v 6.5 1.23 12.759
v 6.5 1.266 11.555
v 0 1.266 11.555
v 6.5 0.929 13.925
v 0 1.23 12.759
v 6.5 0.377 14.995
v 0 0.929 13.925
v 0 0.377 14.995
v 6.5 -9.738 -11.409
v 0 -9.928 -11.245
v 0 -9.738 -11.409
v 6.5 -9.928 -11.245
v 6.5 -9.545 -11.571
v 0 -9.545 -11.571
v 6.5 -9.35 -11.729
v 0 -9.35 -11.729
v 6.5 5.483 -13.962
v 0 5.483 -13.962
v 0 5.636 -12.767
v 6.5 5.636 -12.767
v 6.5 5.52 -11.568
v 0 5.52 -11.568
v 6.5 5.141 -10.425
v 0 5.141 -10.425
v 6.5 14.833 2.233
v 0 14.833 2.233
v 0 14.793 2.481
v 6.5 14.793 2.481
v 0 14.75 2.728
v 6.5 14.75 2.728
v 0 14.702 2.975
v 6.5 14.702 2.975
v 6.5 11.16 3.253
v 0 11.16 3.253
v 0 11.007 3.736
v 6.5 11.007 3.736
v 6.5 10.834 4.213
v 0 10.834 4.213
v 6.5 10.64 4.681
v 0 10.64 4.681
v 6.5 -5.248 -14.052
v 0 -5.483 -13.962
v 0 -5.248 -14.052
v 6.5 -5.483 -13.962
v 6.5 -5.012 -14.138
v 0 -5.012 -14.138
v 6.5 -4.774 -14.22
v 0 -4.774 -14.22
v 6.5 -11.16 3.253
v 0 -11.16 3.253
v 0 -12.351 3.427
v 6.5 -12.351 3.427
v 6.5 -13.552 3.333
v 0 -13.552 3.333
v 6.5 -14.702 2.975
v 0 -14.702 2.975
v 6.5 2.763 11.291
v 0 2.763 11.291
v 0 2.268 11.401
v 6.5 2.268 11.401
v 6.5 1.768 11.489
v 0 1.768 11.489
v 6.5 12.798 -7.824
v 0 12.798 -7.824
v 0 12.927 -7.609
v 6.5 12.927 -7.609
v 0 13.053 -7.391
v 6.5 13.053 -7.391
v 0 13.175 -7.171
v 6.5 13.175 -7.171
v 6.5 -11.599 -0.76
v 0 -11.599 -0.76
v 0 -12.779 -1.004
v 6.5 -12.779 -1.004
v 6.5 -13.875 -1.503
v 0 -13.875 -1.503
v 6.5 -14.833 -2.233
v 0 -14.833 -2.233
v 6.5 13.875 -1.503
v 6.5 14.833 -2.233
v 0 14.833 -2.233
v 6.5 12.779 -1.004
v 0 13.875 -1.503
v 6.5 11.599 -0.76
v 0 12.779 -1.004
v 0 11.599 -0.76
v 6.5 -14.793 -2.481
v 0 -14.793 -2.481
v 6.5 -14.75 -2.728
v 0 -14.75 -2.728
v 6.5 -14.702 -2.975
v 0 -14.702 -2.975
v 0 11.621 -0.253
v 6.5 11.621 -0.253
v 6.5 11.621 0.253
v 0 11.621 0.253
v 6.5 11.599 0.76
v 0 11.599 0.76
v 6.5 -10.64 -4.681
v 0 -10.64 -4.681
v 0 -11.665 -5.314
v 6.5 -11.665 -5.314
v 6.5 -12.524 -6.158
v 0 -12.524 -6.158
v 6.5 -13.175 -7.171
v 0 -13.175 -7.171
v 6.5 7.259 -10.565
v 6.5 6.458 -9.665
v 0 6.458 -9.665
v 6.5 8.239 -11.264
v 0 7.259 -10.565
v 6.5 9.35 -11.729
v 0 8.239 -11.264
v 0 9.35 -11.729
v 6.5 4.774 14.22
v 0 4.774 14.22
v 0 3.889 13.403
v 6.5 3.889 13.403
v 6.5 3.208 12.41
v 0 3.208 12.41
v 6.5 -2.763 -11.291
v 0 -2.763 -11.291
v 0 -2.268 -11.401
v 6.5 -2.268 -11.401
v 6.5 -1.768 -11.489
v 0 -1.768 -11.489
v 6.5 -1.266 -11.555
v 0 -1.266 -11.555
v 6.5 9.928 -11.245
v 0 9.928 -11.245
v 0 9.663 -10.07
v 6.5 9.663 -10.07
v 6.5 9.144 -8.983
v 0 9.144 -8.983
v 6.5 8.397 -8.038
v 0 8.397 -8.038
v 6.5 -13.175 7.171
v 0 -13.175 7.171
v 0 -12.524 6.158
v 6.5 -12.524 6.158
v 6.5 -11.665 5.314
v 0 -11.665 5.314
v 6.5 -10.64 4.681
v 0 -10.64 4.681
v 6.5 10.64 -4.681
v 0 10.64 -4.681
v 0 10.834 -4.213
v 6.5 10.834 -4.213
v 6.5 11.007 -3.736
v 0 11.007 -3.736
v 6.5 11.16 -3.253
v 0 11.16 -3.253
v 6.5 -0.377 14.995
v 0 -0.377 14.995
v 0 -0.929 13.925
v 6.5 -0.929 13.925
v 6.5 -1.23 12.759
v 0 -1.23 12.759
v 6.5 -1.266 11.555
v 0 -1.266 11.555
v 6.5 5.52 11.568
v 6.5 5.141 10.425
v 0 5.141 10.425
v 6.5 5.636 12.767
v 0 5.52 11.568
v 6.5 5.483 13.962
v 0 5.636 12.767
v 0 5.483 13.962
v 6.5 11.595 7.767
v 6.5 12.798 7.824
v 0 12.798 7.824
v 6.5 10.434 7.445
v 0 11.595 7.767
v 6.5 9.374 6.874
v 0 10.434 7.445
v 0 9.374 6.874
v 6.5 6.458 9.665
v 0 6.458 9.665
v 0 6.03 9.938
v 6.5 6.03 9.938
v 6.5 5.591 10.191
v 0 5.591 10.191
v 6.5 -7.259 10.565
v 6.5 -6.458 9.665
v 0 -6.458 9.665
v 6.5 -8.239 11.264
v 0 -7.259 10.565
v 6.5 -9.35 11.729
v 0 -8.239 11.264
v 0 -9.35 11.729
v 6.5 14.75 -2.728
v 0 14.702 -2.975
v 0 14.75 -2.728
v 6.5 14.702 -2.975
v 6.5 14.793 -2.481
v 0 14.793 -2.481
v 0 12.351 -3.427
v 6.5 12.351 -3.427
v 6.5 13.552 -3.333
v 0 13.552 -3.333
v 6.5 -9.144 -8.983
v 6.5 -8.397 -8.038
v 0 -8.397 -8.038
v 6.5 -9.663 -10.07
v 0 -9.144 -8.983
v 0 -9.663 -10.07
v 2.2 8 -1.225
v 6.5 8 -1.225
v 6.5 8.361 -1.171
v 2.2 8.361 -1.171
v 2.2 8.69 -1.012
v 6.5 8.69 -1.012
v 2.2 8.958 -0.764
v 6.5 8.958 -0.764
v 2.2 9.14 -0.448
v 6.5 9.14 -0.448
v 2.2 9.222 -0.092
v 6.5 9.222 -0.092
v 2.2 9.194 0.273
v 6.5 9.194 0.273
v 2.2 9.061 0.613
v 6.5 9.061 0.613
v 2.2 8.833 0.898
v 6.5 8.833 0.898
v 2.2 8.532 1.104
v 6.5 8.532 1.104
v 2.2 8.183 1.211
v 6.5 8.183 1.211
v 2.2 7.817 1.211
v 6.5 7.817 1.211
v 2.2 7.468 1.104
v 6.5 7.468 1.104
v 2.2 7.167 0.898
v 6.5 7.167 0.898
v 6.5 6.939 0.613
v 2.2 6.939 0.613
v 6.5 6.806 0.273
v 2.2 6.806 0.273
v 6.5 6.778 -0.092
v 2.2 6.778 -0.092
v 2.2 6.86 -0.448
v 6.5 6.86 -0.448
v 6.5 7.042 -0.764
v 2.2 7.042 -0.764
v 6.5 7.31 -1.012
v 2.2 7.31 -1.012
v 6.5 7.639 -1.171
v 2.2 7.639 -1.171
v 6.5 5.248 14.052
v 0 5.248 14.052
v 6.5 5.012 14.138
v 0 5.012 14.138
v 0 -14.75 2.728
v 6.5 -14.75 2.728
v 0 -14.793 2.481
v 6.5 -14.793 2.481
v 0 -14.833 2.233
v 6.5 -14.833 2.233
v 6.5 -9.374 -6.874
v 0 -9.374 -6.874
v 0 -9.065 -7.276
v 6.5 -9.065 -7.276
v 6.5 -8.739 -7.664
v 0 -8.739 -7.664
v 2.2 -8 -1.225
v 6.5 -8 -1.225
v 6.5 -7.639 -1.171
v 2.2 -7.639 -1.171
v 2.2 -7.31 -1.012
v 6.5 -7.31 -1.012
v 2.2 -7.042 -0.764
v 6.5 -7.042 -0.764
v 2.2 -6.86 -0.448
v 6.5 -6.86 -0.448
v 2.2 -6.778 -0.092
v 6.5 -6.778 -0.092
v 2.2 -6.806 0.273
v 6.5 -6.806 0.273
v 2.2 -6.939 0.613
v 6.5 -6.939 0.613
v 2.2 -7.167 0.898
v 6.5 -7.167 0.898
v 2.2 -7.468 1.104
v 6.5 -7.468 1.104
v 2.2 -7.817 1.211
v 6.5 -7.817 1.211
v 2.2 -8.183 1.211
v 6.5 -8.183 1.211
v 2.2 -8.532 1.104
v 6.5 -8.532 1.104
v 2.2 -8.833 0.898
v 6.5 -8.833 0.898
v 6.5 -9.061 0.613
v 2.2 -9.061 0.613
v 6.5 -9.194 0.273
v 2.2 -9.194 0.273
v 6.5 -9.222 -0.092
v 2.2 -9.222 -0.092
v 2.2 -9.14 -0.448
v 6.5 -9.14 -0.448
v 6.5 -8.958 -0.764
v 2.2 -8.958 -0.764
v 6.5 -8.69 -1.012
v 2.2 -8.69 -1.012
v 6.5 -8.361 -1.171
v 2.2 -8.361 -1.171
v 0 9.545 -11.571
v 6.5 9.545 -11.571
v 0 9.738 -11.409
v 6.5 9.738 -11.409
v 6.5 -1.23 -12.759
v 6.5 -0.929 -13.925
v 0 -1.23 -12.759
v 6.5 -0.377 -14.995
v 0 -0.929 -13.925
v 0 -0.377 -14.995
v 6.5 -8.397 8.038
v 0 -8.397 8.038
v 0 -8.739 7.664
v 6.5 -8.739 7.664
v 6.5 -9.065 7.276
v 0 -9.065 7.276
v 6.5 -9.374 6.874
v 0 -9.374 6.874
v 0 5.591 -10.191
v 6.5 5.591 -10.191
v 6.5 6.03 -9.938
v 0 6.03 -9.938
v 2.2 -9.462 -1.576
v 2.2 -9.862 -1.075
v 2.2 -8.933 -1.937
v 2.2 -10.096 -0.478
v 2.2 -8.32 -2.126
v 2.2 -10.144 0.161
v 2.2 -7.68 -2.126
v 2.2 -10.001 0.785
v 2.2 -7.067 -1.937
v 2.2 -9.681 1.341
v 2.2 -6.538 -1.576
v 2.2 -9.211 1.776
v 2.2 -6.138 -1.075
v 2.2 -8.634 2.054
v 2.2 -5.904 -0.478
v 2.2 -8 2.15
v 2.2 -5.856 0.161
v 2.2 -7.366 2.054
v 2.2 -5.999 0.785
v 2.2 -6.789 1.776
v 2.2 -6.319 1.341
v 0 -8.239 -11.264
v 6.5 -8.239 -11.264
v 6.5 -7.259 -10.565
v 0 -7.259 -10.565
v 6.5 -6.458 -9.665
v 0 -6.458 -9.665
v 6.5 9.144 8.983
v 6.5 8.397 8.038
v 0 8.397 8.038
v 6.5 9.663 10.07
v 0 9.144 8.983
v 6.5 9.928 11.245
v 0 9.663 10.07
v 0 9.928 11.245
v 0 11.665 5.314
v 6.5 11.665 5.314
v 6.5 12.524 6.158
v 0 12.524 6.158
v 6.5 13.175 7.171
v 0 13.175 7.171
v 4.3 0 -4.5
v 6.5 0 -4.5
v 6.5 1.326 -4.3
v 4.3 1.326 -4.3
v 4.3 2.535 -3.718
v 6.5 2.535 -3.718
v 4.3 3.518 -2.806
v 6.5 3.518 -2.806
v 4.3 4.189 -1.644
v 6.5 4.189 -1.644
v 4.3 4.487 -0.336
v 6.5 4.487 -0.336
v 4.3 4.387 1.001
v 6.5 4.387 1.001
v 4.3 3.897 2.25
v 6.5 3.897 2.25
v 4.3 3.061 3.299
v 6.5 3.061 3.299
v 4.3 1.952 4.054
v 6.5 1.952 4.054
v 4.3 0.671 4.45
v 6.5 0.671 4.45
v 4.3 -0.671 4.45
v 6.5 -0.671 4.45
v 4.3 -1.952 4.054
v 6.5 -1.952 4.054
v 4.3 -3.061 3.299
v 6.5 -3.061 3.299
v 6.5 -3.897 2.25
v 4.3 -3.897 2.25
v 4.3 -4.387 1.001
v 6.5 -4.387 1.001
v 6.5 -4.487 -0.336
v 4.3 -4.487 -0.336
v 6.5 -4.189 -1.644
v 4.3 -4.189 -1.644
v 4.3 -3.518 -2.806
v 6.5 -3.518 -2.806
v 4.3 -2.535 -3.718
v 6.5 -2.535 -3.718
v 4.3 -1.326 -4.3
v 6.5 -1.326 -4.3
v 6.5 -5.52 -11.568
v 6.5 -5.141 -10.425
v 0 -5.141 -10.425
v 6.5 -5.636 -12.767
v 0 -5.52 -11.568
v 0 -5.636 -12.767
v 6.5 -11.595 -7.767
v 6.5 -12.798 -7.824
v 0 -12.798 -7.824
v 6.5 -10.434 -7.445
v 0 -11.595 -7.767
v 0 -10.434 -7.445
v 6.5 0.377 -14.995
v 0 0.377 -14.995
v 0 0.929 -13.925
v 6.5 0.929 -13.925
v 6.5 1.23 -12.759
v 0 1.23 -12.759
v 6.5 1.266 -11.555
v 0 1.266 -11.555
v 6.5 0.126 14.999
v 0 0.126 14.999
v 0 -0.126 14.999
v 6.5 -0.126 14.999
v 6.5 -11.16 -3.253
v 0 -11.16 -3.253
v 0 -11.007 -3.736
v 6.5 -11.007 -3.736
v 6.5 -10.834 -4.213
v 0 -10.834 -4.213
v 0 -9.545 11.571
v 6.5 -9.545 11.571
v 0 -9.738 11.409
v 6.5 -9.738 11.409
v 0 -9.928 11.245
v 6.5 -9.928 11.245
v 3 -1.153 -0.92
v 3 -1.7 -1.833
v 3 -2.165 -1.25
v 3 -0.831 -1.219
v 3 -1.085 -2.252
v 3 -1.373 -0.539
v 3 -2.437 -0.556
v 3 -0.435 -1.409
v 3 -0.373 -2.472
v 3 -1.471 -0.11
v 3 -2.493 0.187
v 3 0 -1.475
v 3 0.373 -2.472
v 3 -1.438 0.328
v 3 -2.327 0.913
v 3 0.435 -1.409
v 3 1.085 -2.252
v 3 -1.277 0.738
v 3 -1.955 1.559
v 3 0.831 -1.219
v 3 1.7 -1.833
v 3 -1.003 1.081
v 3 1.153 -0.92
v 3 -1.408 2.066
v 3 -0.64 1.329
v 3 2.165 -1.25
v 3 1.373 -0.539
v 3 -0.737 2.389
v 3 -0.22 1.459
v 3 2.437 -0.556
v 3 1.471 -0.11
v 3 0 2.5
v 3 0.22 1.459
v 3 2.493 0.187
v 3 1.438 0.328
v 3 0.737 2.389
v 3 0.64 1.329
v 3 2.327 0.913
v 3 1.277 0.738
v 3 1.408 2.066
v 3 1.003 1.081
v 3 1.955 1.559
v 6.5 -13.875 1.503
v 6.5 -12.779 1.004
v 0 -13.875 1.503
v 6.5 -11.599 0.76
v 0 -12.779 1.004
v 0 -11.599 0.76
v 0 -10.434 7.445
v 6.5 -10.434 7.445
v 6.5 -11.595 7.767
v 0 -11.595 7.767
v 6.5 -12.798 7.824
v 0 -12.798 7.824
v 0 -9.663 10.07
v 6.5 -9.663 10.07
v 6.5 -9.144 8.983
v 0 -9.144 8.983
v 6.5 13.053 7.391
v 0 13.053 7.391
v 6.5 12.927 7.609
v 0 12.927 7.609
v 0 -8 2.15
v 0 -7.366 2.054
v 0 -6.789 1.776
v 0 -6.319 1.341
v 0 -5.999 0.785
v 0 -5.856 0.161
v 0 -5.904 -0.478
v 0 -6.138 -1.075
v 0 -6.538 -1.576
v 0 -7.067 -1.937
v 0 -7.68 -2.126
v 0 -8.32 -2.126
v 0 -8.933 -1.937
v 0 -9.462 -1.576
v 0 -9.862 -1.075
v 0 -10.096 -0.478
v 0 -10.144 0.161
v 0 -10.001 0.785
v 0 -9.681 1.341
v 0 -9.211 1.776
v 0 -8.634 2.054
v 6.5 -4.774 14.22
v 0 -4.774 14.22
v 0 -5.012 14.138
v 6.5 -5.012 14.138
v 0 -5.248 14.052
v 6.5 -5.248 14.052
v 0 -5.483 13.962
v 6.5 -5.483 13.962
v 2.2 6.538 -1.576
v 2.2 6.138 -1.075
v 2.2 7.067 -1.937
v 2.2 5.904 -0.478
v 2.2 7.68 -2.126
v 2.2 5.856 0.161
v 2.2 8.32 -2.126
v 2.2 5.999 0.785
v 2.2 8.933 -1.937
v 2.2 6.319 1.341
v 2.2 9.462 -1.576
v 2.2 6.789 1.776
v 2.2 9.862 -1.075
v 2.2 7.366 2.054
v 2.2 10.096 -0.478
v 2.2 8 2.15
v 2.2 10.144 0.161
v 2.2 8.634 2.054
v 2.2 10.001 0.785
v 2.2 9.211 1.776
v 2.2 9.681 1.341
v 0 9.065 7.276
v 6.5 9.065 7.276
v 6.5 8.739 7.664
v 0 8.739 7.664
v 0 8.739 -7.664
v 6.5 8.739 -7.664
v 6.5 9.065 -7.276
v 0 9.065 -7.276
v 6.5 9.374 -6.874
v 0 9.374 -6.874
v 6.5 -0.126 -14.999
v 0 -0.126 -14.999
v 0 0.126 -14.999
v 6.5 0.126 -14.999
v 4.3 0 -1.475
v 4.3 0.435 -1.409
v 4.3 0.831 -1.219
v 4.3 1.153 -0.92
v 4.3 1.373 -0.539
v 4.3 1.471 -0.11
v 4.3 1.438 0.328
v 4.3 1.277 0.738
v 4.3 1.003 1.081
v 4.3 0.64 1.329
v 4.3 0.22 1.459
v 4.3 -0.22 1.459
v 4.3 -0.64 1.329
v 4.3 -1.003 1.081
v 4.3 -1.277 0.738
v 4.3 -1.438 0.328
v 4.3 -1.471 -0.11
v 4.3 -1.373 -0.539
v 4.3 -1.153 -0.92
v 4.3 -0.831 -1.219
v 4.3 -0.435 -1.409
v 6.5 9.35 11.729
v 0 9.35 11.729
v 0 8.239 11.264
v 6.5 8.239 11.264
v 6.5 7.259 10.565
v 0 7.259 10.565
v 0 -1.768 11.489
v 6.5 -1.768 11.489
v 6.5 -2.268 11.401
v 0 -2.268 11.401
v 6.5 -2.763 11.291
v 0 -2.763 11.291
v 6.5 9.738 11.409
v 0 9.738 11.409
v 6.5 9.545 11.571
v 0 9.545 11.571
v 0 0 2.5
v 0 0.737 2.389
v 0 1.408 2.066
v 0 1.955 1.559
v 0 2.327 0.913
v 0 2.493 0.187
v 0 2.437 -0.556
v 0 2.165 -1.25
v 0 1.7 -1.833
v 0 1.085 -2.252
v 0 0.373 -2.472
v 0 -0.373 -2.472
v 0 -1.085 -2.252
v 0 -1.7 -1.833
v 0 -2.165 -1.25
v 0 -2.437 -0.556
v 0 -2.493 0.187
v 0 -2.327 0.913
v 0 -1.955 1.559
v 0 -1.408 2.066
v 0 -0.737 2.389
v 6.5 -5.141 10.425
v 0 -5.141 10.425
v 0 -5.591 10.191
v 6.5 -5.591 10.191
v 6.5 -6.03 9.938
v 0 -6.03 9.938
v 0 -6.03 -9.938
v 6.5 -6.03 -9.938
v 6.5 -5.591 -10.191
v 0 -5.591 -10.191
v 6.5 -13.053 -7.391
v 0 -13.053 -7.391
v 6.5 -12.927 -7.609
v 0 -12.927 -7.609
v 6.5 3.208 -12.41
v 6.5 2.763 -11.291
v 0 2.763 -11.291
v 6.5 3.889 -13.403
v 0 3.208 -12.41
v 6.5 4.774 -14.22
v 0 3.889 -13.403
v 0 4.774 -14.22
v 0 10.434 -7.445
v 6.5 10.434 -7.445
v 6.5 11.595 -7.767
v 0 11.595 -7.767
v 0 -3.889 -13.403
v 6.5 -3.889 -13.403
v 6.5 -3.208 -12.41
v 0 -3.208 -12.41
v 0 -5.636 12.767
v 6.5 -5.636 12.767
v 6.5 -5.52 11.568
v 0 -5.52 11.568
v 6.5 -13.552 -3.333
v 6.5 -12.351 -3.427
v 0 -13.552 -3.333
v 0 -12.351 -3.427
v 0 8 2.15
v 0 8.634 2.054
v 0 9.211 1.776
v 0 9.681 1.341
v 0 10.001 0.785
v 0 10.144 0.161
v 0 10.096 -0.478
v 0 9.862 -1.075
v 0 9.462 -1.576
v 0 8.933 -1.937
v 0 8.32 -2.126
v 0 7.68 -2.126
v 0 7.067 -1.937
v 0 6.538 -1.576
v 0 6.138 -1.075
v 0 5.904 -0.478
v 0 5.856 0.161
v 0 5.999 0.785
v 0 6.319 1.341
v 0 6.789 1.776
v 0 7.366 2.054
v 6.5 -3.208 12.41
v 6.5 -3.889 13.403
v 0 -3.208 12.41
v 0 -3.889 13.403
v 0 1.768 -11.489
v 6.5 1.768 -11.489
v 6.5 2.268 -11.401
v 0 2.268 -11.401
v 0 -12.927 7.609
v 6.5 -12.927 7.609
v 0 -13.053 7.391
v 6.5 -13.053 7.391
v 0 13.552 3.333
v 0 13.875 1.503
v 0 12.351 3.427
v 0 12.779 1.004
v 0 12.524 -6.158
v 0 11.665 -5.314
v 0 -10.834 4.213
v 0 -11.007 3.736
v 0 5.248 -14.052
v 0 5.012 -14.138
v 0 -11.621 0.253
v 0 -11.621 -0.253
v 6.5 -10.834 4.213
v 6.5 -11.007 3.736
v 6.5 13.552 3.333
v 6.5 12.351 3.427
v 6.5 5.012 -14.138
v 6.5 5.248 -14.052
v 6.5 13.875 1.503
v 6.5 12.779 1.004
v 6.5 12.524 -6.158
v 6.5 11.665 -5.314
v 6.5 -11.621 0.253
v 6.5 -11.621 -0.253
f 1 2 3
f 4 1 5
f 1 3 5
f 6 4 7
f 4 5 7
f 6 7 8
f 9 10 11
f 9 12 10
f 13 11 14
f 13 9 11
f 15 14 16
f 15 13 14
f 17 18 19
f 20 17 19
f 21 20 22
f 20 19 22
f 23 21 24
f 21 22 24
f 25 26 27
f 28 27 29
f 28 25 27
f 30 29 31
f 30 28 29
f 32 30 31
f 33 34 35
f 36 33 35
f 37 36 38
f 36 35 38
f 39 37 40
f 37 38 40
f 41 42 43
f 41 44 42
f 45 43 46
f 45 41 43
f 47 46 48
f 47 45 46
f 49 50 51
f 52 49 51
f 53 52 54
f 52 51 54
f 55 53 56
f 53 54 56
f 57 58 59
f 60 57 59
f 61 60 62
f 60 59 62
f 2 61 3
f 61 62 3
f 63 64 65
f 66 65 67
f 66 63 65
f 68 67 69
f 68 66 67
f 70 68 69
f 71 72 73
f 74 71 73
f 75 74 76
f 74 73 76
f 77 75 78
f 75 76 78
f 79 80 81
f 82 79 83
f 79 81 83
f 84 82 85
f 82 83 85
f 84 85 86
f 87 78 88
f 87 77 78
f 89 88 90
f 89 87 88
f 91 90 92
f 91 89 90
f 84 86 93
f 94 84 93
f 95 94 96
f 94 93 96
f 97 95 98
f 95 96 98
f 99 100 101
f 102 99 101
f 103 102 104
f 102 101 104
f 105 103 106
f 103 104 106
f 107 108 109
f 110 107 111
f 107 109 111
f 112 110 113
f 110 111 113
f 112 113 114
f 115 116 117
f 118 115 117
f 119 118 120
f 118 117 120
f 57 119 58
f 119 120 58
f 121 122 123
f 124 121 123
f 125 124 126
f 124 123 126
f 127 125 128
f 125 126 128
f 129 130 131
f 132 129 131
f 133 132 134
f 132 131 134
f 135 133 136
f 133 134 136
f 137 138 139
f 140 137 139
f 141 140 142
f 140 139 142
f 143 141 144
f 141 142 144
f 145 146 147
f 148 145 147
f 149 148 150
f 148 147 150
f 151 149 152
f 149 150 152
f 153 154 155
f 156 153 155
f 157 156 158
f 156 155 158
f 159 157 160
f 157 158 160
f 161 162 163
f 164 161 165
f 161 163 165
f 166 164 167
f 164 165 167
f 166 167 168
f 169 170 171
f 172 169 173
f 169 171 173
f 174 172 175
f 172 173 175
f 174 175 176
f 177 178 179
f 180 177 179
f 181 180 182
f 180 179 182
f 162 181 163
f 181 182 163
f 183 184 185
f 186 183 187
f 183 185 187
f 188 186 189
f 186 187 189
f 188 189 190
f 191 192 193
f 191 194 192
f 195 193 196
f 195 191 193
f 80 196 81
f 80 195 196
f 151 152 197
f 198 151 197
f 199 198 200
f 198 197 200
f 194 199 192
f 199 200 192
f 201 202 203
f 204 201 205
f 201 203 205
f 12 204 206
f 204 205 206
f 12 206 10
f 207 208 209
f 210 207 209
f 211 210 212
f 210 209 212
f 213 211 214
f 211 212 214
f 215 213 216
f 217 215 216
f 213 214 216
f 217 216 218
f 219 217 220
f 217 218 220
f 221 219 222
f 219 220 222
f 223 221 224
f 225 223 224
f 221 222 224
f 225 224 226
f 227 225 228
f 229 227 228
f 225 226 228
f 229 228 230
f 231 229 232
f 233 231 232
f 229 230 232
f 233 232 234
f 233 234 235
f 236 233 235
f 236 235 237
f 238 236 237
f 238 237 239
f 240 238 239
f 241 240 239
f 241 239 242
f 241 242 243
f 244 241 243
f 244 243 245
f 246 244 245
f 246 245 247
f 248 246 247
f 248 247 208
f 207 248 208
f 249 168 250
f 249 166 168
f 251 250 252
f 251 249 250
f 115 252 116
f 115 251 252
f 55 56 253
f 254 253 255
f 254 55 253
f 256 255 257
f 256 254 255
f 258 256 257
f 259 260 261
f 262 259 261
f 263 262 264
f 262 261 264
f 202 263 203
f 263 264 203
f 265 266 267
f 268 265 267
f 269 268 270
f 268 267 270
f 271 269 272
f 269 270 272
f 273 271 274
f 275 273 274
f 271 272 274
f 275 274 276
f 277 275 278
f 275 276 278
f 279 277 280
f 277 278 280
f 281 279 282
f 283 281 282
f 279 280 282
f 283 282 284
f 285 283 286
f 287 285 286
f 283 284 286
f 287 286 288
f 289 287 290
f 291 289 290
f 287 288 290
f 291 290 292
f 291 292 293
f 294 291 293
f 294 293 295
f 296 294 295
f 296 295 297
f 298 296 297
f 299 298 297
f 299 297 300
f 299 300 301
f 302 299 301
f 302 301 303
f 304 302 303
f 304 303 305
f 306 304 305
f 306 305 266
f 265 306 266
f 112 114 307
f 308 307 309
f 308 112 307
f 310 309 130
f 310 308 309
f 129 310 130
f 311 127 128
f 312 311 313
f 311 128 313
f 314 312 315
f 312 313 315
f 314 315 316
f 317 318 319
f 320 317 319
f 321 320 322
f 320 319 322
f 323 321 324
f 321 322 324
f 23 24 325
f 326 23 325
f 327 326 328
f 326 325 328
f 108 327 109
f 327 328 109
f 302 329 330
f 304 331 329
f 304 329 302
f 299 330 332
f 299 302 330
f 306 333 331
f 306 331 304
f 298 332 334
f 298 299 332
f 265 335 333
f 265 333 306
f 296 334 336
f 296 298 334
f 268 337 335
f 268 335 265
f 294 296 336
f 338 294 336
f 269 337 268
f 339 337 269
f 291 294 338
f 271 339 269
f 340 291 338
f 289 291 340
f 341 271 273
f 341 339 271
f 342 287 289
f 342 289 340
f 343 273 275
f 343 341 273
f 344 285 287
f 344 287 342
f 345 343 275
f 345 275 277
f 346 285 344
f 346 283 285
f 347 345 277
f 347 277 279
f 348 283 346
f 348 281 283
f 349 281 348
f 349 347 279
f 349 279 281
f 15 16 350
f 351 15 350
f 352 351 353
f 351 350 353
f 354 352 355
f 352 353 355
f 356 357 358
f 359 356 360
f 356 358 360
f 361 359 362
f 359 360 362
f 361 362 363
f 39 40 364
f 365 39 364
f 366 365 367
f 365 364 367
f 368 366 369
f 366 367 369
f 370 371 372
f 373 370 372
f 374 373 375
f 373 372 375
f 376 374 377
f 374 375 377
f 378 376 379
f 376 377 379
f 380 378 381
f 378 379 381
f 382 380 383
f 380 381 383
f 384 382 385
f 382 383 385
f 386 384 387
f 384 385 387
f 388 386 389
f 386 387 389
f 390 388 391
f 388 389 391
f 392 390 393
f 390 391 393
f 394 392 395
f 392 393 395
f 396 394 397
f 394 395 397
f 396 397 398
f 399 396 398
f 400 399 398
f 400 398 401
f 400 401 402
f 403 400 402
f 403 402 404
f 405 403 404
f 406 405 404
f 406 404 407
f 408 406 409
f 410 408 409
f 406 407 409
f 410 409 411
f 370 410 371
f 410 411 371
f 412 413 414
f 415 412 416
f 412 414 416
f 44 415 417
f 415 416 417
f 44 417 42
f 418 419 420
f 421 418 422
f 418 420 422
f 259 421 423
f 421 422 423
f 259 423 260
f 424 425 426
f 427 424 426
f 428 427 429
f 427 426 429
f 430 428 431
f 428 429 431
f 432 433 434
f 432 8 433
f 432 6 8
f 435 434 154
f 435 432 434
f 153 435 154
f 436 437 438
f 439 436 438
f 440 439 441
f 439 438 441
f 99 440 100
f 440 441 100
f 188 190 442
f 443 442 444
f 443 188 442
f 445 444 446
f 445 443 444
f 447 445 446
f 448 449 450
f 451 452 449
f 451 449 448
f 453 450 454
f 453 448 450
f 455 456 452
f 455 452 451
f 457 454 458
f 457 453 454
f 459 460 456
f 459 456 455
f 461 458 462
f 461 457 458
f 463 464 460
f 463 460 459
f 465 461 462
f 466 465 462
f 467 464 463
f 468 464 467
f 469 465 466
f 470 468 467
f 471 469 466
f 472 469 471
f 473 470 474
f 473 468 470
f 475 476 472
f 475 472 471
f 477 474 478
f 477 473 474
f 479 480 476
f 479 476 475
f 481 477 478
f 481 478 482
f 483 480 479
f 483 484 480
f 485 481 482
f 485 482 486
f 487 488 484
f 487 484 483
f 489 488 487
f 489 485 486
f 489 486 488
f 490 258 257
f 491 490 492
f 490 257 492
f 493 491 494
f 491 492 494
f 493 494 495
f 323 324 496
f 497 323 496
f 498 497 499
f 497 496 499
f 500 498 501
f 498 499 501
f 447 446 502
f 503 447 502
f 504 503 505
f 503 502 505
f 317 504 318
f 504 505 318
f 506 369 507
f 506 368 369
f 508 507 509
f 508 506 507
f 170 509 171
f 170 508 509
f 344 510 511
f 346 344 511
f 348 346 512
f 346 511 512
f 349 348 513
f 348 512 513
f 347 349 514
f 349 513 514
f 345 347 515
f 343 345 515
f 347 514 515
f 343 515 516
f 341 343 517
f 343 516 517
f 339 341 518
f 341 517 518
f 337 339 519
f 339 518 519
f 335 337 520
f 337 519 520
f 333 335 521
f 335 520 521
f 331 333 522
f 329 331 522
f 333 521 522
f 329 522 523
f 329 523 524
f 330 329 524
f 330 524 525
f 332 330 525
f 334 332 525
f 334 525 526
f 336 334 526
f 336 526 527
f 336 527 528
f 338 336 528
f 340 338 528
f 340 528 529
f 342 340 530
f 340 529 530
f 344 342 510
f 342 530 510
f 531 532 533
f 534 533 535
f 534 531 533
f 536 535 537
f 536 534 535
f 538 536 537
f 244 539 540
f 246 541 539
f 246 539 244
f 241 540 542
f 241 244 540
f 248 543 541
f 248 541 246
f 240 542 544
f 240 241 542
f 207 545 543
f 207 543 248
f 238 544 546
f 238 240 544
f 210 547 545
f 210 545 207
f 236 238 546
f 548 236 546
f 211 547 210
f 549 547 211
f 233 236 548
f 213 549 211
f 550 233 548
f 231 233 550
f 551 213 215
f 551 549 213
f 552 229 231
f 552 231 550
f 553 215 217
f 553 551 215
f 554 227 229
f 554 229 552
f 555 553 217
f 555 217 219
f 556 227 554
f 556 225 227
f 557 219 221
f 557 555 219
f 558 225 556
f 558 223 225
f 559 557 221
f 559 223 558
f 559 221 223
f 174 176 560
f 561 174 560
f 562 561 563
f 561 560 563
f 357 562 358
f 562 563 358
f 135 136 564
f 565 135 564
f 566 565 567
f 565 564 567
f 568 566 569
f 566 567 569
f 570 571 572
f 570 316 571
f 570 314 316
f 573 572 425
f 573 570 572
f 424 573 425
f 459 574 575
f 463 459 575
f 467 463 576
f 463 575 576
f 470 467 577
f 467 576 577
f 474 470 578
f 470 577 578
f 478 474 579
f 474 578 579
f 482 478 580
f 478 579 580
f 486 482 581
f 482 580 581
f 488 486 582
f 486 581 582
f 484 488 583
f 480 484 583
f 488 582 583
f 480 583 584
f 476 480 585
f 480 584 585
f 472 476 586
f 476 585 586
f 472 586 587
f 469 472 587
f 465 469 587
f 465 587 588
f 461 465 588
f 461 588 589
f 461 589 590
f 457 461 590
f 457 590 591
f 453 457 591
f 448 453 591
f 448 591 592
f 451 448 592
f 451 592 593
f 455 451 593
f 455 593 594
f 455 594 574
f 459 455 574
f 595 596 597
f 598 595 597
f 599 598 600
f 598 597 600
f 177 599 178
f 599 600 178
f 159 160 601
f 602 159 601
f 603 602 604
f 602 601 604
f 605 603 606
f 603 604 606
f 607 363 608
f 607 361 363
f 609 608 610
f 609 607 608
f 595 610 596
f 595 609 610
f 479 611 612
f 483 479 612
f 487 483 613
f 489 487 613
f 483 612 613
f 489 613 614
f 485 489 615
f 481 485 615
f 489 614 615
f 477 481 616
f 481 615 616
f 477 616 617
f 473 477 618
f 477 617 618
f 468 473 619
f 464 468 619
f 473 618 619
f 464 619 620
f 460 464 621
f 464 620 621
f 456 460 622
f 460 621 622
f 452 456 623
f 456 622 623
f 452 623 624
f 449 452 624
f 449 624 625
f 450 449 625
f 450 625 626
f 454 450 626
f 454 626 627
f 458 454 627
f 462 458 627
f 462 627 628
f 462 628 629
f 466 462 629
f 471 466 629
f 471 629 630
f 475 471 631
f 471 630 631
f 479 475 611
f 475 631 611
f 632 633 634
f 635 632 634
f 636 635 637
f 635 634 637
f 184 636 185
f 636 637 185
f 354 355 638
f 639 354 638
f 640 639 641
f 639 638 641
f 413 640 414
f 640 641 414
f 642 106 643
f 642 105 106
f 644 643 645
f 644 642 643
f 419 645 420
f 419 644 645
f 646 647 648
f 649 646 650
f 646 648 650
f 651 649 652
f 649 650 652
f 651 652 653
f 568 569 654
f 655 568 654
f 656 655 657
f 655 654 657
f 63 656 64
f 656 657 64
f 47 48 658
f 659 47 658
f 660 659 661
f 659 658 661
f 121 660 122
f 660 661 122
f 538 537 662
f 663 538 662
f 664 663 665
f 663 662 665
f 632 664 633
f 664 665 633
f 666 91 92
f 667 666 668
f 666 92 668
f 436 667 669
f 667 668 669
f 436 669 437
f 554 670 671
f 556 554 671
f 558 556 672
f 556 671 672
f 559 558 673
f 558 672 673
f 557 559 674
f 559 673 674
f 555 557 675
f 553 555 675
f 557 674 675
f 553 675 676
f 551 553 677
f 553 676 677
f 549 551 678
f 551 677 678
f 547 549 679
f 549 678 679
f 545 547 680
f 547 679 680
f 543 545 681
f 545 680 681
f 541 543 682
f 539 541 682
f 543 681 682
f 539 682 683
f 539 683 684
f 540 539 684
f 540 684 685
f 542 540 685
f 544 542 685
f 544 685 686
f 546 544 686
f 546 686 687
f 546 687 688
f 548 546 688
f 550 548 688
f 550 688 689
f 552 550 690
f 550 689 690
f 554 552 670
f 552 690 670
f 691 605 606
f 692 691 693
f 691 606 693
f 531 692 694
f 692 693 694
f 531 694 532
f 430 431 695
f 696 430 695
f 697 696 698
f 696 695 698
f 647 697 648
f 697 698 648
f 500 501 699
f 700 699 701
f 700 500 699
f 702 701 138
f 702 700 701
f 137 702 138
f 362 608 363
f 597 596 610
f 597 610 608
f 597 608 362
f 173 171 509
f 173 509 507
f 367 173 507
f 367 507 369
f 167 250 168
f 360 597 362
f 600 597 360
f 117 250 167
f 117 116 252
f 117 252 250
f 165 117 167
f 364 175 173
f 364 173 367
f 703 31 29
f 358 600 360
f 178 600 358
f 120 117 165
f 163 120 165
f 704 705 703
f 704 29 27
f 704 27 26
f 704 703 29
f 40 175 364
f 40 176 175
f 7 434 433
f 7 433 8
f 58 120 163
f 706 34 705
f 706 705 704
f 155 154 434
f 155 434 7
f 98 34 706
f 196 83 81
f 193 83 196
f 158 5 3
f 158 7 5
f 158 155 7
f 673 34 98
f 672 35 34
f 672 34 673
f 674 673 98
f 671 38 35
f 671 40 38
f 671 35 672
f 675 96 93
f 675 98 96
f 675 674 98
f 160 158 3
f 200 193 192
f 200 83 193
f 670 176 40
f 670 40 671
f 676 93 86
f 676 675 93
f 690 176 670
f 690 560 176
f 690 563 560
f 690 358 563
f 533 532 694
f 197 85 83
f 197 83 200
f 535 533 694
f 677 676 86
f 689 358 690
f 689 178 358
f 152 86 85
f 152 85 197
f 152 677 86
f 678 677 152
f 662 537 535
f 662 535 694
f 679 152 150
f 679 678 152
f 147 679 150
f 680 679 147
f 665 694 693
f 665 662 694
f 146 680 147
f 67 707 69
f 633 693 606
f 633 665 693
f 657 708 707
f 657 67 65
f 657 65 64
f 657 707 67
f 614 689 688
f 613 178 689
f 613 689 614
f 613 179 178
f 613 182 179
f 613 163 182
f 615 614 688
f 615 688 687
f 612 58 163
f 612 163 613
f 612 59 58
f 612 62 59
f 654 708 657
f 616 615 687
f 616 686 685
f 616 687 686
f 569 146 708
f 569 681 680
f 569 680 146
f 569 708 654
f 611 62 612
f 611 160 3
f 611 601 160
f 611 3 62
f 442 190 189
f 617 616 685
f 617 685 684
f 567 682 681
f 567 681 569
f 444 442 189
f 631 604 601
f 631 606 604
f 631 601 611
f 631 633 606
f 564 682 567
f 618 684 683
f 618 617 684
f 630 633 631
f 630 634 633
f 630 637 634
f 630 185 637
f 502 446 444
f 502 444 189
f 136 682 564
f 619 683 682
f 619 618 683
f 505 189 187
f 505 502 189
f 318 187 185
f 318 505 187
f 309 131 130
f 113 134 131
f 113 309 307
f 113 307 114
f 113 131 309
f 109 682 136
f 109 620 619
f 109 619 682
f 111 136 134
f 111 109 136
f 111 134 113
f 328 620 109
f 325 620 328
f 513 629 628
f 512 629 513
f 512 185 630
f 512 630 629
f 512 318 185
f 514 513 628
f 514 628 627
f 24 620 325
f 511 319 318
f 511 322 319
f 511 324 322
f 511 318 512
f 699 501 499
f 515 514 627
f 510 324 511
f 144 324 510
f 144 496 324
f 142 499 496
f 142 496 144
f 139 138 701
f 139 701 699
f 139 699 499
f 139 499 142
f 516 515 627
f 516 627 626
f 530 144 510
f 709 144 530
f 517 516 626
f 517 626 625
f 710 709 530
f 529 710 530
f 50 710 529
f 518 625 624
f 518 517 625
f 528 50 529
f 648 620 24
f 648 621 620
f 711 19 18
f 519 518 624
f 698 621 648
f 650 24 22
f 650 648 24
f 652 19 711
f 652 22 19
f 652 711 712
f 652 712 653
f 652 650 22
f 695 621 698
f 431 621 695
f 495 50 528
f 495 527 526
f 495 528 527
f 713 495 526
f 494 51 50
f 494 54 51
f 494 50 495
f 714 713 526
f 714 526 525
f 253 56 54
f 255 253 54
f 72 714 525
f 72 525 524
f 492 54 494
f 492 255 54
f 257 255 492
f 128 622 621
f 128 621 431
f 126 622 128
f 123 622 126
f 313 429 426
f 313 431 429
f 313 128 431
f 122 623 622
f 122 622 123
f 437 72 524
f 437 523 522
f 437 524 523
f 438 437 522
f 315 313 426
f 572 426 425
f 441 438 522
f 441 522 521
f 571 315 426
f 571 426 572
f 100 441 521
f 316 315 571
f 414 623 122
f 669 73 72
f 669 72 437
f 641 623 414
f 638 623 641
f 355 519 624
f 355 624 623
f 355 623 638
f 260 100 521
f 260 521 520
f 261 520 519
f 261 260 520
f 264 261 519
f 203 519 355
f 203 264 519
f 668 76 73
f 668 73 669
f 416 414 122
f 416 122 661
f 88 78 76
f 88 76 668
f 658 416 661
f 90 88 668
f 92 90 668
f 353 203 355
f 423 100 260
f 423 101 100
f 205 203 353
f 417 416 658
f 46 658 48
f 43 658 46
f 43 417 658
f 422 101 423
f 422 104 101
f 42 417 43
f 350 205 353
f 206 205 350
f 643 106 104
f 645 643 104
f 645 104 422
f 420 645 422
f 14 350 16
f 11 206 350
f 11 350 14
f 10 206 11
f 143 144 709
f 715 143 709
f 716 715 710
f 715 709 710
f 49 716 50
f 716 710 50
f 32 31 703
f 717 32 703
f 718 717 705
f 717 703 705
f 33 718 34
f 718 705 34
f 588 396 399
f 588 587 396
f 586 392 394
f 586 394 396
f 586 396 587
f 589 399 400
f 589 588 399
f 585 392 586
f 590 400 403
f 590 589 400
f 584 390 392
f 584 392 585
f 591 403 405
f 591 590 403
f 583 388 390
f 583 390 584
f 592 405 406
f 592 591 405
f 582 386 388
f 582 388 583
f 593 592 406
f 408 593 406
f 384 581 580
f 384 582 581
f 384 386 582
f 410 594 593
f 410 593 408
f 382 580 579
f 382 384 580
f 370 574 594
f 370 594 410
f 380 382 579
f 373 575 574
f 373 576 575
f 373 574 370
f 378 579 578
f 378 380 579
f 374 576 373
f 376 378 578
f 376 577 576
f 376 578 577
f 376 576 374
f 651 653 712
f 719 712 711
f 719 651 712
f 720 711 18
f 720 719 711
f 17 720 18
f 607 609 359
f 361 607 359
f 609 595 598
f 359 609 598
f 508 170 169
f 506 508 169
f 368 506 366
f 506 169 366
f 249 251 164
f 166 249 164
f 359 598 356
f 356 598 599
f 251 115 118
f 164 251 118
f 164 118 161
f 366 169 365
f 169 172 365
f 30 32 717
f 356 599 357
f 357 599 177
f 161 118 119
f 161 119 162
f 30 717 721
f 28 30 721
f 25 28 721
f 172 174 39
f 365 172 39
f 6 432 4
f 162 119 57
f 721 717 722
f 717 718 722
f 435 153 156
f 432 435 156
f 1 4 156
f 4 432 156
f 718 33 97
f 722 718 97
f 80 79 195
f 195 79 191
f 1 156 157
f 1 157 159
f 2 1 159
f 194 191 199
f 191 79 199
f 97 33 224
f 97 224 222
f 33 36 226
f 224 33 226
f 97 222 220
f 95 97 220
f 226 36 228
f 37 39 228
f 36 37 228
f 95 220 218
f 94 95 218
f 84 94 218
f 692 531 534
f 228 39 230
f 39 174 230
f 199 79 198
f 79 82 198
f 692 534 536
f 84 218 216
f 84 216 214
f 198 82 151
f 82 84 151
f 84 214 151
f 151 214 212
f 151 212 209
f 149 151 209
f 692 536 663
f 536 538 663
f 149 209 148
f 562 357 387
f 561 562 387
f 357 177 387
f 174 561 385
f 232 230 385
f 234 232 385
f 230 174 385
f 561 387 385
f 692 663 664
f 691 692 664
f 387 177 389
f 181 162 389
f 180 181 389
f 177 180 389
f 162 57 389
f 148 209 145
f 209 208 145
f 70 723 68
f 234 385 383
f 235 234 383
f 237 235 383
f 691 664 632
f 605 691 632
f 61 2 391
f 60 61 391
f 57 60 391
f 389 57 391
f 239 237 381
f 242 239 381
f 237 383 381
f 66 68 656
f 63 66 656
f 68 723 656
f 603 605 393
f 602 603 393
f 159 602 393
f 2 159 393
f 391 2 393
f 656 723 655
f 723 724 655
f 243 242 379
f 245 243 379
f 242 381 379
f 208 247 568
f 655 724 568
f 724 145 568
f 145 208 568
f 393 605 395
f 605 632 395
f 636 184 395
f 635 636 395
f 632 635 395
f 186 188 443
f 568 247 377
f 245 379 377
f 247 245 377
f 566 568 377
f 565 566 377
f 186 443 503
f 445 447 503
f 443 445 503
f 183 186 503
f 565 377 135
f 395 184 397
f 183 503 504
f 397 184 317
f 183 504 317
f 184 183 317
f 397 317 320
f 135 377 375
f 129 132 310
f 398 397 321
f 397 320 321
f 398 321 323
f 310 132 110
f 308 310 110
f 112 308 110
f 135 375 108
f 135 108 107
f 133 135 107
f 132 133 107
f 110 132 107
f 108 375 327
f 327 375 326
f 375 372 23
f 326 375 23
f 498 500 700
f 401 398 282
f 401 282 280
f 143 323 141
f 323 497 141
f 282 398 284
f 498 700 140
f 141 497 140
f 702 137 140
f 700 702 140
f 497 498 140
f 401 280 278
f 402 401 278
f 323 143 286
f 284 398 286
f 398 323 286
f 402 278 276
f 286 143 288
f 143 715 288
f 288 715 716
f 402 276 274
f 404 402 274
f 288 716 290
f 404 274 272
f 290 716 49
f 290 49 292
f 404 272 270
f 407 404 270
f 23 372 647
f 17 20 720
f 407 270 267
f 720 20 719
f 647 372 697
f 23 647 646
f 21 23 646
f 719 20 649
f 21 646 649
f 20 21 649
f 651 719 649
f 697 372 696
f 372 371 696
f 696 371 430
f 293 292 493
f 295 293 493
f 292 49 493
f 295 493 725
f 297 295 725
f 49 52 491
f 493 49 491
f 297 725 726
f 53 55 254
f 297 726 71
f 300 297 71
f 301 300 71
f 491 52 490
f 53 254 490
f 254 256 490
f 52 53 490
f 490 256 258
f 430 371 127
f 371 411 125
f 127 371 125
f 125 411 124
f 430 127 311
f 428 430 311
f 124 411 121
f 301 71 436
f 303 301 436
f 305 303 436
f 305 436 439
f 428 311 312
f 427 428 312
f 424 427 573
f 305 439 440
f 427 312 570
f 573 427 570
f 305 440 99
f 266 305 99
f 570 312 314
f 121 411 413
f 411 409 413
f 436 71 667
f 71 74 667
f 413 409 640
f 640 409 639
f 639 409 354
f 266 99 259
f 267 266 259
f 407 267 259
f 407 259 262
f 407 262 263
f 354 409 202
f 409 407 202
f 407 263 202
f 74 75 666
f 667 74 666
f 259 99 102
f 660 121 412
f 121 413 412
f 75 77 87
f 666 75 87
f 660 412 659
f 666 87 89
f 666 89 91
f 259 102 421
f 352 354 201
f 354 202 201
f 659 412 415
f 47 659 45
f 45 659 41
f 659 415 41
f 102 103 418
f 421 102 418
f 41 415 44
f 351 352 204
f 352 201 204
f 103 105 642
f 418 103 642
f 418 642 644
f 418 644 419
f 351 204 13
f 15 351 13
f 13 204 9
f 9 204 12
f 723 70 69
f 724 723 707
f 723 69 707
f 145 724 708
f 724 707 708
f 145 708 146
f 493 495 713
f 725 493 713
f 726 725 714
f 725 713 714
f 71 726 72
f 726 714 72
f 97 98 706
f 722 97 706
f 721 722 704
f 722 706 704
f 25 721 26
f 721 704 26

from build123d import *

# Parameters (mm, degrees)
BASPROSKE_W         = 6.5
BASPROSKE_H         = 15
TOOTHCUT_DEPTH      = 23.186707732
TEETHCUTS_COUNT     = 18
TEETHCUTS_ANGLE     = 340
BORSKE_R            = 0.4
BORE_DEPTH          = 50.0000508
SKETCH_1_R          = 4.5
CUT_EXTRUDE_1_DEPTH = 2.2
SKETCH_2_R          = 1.475
CUT_EXTRUDE_2_DEPTH = 22.529170235
SKETCH_3_R          = 1.225
CUT_EXTRUDE_3_DEPTH = 23.074083695
SKETCH_4_R          = 2.15
CUT_EXTRUDE_5_DEPTH = 2.2
SKETCH_5_R          = 2.5
CUT_EXTRUDE_6_DEPTH = 3


with BuildPart() as part:
    # BasProSke → Base-Revolve (revolve)
    with BuildSketch(Plane(origin=(0, 0, 0), x_dir=(1, 0, 0), z_dir=(0, 1, 0)), mode=Mode.PRIVATE) as base_revolve_sk:
        with Locations((3.25, 7.5)):
            Rectangle(BASPROSKE_W, BASPROSKE_H)
    revolve(base_revolve_sk.sketch.rotate(Axis((-10, 0, 0), (1, 0, 0)), 180), axis=Axis((-10, 0, 0), (1, 0, 0)))

    # TooCutSke → ToothCut (cut, through all)
    with BuildSketch(Plane(origin=(0, 0, 0), x_dir=(0, 0, -1), z_dir=(1, 0, 0))):
        with BuildLine():
            ThreePointArc((0.759974923, 11.599129886), (0, 11.624), (-0.759974923, 11.599129886))
            ThreePointArc((-0.759974923, 11.599129886), (-1.229186471, 13.354767823), (-2.254227748, 14.855339189))
            ThreePointArc((-2.254227748, 14.855339189), (0, 15.0254), (2.254227748, 14.855339189))
            ThreePointArc((2.254227748, 14.855339189), (1.229186471, 13.354767823), (0.759974923, 11.599129886))
        make_face()
    toothcut = extrude(amount=TOOTHCUT_DEPTH, mode=Mode.SUBTRACT)

    # TeethCuts: ToothCut ×18 about axis
    teethcuts_axis = Axis((-10, 0, 0), (1, 0, 0))
    for i in range(1, TEETHCUTS_COUNT):
        add(toothcut.rotate(teethcuts_axis, i * TEETHCUTS_ANGLE / (TEETHCUTS_COUNT - 1)), mode=Mode.SUBTRACT)

    # BorSke → Bore (cut, symmetric)
    with BuildSketch(Plane(origin=(0, 0, 0), x_dir=(0, 0, -1), z_dir=(1, 0, 0))):
        with Locations(Location((0, 0, 0), (0, 0, 180))):
            Circle(BORSKE_R)
    extrude(amount=BORE_DEPTH, both=True, mode=Mode.SUBTRACT)

    # 草图1 → 切除-拉伸1 (cut)
    with BuildSketch(Plane(origin=(6.5, 0, 0), x_dir=(0, 0, -1), z_dir=(1, 0, 0))):
        Circle(SKETCH_1_R)
    extrude(amount=-CUT_EXTRUDE_1_DEPTH, mode=Mode.SUBTRACT)

    # 草图2 → 切除-拉伸2 (cut, through all)
    with BuildSketch(Plane(origin=(4.3, 0, 0), x_dir=(0, 0, -1), z_dir=(1, 0, 0))):
        Circle(SKETCH_2_R)
    extrude(amount=-CUT_EXTRUDE_2_DEPTH, mode=Mode.SUBTRACT)

    # 草图3 → 切除-拉伸3 (cut, through all)
    with BuildSketch(Plane(origin=(6.5, 0, 0), x_dir=(0, 0, -1), z_dir=(1, 0, 0))):
        with Locations((0, -8)):
            Circle(SKETCH_3_R)
        with Locations((0, 8)):
            Circle(SKETCH_3_R)
    extrude(amount=-CUT_EXTRUDE_3_DEPTH, mode=Mode.SUBTRACT)

    # 草图4 → 切除-拉伸5 (cut)
    with BuildSketch(Plane.ZY):
        with Locations((0, -8)):
            Circle(SKETCH_4_R)
        with Locations((0, 8)):
            Circle(SKETCH_4_R)
    extrude(amount=-CUT_EXTRUDE_5_DEPTH, mode=Mode.SUBTRACT)

    # 草图5 → 切除-拉伸6 (cut)
    with BuildSketch(Plane.ZY):
        Circle(SKETCH_5_R)
    extrude(amount=-CUT_EXTRUDE_6_DEPTH, mode=Mode.SUBTRACT)


solid = part.part
